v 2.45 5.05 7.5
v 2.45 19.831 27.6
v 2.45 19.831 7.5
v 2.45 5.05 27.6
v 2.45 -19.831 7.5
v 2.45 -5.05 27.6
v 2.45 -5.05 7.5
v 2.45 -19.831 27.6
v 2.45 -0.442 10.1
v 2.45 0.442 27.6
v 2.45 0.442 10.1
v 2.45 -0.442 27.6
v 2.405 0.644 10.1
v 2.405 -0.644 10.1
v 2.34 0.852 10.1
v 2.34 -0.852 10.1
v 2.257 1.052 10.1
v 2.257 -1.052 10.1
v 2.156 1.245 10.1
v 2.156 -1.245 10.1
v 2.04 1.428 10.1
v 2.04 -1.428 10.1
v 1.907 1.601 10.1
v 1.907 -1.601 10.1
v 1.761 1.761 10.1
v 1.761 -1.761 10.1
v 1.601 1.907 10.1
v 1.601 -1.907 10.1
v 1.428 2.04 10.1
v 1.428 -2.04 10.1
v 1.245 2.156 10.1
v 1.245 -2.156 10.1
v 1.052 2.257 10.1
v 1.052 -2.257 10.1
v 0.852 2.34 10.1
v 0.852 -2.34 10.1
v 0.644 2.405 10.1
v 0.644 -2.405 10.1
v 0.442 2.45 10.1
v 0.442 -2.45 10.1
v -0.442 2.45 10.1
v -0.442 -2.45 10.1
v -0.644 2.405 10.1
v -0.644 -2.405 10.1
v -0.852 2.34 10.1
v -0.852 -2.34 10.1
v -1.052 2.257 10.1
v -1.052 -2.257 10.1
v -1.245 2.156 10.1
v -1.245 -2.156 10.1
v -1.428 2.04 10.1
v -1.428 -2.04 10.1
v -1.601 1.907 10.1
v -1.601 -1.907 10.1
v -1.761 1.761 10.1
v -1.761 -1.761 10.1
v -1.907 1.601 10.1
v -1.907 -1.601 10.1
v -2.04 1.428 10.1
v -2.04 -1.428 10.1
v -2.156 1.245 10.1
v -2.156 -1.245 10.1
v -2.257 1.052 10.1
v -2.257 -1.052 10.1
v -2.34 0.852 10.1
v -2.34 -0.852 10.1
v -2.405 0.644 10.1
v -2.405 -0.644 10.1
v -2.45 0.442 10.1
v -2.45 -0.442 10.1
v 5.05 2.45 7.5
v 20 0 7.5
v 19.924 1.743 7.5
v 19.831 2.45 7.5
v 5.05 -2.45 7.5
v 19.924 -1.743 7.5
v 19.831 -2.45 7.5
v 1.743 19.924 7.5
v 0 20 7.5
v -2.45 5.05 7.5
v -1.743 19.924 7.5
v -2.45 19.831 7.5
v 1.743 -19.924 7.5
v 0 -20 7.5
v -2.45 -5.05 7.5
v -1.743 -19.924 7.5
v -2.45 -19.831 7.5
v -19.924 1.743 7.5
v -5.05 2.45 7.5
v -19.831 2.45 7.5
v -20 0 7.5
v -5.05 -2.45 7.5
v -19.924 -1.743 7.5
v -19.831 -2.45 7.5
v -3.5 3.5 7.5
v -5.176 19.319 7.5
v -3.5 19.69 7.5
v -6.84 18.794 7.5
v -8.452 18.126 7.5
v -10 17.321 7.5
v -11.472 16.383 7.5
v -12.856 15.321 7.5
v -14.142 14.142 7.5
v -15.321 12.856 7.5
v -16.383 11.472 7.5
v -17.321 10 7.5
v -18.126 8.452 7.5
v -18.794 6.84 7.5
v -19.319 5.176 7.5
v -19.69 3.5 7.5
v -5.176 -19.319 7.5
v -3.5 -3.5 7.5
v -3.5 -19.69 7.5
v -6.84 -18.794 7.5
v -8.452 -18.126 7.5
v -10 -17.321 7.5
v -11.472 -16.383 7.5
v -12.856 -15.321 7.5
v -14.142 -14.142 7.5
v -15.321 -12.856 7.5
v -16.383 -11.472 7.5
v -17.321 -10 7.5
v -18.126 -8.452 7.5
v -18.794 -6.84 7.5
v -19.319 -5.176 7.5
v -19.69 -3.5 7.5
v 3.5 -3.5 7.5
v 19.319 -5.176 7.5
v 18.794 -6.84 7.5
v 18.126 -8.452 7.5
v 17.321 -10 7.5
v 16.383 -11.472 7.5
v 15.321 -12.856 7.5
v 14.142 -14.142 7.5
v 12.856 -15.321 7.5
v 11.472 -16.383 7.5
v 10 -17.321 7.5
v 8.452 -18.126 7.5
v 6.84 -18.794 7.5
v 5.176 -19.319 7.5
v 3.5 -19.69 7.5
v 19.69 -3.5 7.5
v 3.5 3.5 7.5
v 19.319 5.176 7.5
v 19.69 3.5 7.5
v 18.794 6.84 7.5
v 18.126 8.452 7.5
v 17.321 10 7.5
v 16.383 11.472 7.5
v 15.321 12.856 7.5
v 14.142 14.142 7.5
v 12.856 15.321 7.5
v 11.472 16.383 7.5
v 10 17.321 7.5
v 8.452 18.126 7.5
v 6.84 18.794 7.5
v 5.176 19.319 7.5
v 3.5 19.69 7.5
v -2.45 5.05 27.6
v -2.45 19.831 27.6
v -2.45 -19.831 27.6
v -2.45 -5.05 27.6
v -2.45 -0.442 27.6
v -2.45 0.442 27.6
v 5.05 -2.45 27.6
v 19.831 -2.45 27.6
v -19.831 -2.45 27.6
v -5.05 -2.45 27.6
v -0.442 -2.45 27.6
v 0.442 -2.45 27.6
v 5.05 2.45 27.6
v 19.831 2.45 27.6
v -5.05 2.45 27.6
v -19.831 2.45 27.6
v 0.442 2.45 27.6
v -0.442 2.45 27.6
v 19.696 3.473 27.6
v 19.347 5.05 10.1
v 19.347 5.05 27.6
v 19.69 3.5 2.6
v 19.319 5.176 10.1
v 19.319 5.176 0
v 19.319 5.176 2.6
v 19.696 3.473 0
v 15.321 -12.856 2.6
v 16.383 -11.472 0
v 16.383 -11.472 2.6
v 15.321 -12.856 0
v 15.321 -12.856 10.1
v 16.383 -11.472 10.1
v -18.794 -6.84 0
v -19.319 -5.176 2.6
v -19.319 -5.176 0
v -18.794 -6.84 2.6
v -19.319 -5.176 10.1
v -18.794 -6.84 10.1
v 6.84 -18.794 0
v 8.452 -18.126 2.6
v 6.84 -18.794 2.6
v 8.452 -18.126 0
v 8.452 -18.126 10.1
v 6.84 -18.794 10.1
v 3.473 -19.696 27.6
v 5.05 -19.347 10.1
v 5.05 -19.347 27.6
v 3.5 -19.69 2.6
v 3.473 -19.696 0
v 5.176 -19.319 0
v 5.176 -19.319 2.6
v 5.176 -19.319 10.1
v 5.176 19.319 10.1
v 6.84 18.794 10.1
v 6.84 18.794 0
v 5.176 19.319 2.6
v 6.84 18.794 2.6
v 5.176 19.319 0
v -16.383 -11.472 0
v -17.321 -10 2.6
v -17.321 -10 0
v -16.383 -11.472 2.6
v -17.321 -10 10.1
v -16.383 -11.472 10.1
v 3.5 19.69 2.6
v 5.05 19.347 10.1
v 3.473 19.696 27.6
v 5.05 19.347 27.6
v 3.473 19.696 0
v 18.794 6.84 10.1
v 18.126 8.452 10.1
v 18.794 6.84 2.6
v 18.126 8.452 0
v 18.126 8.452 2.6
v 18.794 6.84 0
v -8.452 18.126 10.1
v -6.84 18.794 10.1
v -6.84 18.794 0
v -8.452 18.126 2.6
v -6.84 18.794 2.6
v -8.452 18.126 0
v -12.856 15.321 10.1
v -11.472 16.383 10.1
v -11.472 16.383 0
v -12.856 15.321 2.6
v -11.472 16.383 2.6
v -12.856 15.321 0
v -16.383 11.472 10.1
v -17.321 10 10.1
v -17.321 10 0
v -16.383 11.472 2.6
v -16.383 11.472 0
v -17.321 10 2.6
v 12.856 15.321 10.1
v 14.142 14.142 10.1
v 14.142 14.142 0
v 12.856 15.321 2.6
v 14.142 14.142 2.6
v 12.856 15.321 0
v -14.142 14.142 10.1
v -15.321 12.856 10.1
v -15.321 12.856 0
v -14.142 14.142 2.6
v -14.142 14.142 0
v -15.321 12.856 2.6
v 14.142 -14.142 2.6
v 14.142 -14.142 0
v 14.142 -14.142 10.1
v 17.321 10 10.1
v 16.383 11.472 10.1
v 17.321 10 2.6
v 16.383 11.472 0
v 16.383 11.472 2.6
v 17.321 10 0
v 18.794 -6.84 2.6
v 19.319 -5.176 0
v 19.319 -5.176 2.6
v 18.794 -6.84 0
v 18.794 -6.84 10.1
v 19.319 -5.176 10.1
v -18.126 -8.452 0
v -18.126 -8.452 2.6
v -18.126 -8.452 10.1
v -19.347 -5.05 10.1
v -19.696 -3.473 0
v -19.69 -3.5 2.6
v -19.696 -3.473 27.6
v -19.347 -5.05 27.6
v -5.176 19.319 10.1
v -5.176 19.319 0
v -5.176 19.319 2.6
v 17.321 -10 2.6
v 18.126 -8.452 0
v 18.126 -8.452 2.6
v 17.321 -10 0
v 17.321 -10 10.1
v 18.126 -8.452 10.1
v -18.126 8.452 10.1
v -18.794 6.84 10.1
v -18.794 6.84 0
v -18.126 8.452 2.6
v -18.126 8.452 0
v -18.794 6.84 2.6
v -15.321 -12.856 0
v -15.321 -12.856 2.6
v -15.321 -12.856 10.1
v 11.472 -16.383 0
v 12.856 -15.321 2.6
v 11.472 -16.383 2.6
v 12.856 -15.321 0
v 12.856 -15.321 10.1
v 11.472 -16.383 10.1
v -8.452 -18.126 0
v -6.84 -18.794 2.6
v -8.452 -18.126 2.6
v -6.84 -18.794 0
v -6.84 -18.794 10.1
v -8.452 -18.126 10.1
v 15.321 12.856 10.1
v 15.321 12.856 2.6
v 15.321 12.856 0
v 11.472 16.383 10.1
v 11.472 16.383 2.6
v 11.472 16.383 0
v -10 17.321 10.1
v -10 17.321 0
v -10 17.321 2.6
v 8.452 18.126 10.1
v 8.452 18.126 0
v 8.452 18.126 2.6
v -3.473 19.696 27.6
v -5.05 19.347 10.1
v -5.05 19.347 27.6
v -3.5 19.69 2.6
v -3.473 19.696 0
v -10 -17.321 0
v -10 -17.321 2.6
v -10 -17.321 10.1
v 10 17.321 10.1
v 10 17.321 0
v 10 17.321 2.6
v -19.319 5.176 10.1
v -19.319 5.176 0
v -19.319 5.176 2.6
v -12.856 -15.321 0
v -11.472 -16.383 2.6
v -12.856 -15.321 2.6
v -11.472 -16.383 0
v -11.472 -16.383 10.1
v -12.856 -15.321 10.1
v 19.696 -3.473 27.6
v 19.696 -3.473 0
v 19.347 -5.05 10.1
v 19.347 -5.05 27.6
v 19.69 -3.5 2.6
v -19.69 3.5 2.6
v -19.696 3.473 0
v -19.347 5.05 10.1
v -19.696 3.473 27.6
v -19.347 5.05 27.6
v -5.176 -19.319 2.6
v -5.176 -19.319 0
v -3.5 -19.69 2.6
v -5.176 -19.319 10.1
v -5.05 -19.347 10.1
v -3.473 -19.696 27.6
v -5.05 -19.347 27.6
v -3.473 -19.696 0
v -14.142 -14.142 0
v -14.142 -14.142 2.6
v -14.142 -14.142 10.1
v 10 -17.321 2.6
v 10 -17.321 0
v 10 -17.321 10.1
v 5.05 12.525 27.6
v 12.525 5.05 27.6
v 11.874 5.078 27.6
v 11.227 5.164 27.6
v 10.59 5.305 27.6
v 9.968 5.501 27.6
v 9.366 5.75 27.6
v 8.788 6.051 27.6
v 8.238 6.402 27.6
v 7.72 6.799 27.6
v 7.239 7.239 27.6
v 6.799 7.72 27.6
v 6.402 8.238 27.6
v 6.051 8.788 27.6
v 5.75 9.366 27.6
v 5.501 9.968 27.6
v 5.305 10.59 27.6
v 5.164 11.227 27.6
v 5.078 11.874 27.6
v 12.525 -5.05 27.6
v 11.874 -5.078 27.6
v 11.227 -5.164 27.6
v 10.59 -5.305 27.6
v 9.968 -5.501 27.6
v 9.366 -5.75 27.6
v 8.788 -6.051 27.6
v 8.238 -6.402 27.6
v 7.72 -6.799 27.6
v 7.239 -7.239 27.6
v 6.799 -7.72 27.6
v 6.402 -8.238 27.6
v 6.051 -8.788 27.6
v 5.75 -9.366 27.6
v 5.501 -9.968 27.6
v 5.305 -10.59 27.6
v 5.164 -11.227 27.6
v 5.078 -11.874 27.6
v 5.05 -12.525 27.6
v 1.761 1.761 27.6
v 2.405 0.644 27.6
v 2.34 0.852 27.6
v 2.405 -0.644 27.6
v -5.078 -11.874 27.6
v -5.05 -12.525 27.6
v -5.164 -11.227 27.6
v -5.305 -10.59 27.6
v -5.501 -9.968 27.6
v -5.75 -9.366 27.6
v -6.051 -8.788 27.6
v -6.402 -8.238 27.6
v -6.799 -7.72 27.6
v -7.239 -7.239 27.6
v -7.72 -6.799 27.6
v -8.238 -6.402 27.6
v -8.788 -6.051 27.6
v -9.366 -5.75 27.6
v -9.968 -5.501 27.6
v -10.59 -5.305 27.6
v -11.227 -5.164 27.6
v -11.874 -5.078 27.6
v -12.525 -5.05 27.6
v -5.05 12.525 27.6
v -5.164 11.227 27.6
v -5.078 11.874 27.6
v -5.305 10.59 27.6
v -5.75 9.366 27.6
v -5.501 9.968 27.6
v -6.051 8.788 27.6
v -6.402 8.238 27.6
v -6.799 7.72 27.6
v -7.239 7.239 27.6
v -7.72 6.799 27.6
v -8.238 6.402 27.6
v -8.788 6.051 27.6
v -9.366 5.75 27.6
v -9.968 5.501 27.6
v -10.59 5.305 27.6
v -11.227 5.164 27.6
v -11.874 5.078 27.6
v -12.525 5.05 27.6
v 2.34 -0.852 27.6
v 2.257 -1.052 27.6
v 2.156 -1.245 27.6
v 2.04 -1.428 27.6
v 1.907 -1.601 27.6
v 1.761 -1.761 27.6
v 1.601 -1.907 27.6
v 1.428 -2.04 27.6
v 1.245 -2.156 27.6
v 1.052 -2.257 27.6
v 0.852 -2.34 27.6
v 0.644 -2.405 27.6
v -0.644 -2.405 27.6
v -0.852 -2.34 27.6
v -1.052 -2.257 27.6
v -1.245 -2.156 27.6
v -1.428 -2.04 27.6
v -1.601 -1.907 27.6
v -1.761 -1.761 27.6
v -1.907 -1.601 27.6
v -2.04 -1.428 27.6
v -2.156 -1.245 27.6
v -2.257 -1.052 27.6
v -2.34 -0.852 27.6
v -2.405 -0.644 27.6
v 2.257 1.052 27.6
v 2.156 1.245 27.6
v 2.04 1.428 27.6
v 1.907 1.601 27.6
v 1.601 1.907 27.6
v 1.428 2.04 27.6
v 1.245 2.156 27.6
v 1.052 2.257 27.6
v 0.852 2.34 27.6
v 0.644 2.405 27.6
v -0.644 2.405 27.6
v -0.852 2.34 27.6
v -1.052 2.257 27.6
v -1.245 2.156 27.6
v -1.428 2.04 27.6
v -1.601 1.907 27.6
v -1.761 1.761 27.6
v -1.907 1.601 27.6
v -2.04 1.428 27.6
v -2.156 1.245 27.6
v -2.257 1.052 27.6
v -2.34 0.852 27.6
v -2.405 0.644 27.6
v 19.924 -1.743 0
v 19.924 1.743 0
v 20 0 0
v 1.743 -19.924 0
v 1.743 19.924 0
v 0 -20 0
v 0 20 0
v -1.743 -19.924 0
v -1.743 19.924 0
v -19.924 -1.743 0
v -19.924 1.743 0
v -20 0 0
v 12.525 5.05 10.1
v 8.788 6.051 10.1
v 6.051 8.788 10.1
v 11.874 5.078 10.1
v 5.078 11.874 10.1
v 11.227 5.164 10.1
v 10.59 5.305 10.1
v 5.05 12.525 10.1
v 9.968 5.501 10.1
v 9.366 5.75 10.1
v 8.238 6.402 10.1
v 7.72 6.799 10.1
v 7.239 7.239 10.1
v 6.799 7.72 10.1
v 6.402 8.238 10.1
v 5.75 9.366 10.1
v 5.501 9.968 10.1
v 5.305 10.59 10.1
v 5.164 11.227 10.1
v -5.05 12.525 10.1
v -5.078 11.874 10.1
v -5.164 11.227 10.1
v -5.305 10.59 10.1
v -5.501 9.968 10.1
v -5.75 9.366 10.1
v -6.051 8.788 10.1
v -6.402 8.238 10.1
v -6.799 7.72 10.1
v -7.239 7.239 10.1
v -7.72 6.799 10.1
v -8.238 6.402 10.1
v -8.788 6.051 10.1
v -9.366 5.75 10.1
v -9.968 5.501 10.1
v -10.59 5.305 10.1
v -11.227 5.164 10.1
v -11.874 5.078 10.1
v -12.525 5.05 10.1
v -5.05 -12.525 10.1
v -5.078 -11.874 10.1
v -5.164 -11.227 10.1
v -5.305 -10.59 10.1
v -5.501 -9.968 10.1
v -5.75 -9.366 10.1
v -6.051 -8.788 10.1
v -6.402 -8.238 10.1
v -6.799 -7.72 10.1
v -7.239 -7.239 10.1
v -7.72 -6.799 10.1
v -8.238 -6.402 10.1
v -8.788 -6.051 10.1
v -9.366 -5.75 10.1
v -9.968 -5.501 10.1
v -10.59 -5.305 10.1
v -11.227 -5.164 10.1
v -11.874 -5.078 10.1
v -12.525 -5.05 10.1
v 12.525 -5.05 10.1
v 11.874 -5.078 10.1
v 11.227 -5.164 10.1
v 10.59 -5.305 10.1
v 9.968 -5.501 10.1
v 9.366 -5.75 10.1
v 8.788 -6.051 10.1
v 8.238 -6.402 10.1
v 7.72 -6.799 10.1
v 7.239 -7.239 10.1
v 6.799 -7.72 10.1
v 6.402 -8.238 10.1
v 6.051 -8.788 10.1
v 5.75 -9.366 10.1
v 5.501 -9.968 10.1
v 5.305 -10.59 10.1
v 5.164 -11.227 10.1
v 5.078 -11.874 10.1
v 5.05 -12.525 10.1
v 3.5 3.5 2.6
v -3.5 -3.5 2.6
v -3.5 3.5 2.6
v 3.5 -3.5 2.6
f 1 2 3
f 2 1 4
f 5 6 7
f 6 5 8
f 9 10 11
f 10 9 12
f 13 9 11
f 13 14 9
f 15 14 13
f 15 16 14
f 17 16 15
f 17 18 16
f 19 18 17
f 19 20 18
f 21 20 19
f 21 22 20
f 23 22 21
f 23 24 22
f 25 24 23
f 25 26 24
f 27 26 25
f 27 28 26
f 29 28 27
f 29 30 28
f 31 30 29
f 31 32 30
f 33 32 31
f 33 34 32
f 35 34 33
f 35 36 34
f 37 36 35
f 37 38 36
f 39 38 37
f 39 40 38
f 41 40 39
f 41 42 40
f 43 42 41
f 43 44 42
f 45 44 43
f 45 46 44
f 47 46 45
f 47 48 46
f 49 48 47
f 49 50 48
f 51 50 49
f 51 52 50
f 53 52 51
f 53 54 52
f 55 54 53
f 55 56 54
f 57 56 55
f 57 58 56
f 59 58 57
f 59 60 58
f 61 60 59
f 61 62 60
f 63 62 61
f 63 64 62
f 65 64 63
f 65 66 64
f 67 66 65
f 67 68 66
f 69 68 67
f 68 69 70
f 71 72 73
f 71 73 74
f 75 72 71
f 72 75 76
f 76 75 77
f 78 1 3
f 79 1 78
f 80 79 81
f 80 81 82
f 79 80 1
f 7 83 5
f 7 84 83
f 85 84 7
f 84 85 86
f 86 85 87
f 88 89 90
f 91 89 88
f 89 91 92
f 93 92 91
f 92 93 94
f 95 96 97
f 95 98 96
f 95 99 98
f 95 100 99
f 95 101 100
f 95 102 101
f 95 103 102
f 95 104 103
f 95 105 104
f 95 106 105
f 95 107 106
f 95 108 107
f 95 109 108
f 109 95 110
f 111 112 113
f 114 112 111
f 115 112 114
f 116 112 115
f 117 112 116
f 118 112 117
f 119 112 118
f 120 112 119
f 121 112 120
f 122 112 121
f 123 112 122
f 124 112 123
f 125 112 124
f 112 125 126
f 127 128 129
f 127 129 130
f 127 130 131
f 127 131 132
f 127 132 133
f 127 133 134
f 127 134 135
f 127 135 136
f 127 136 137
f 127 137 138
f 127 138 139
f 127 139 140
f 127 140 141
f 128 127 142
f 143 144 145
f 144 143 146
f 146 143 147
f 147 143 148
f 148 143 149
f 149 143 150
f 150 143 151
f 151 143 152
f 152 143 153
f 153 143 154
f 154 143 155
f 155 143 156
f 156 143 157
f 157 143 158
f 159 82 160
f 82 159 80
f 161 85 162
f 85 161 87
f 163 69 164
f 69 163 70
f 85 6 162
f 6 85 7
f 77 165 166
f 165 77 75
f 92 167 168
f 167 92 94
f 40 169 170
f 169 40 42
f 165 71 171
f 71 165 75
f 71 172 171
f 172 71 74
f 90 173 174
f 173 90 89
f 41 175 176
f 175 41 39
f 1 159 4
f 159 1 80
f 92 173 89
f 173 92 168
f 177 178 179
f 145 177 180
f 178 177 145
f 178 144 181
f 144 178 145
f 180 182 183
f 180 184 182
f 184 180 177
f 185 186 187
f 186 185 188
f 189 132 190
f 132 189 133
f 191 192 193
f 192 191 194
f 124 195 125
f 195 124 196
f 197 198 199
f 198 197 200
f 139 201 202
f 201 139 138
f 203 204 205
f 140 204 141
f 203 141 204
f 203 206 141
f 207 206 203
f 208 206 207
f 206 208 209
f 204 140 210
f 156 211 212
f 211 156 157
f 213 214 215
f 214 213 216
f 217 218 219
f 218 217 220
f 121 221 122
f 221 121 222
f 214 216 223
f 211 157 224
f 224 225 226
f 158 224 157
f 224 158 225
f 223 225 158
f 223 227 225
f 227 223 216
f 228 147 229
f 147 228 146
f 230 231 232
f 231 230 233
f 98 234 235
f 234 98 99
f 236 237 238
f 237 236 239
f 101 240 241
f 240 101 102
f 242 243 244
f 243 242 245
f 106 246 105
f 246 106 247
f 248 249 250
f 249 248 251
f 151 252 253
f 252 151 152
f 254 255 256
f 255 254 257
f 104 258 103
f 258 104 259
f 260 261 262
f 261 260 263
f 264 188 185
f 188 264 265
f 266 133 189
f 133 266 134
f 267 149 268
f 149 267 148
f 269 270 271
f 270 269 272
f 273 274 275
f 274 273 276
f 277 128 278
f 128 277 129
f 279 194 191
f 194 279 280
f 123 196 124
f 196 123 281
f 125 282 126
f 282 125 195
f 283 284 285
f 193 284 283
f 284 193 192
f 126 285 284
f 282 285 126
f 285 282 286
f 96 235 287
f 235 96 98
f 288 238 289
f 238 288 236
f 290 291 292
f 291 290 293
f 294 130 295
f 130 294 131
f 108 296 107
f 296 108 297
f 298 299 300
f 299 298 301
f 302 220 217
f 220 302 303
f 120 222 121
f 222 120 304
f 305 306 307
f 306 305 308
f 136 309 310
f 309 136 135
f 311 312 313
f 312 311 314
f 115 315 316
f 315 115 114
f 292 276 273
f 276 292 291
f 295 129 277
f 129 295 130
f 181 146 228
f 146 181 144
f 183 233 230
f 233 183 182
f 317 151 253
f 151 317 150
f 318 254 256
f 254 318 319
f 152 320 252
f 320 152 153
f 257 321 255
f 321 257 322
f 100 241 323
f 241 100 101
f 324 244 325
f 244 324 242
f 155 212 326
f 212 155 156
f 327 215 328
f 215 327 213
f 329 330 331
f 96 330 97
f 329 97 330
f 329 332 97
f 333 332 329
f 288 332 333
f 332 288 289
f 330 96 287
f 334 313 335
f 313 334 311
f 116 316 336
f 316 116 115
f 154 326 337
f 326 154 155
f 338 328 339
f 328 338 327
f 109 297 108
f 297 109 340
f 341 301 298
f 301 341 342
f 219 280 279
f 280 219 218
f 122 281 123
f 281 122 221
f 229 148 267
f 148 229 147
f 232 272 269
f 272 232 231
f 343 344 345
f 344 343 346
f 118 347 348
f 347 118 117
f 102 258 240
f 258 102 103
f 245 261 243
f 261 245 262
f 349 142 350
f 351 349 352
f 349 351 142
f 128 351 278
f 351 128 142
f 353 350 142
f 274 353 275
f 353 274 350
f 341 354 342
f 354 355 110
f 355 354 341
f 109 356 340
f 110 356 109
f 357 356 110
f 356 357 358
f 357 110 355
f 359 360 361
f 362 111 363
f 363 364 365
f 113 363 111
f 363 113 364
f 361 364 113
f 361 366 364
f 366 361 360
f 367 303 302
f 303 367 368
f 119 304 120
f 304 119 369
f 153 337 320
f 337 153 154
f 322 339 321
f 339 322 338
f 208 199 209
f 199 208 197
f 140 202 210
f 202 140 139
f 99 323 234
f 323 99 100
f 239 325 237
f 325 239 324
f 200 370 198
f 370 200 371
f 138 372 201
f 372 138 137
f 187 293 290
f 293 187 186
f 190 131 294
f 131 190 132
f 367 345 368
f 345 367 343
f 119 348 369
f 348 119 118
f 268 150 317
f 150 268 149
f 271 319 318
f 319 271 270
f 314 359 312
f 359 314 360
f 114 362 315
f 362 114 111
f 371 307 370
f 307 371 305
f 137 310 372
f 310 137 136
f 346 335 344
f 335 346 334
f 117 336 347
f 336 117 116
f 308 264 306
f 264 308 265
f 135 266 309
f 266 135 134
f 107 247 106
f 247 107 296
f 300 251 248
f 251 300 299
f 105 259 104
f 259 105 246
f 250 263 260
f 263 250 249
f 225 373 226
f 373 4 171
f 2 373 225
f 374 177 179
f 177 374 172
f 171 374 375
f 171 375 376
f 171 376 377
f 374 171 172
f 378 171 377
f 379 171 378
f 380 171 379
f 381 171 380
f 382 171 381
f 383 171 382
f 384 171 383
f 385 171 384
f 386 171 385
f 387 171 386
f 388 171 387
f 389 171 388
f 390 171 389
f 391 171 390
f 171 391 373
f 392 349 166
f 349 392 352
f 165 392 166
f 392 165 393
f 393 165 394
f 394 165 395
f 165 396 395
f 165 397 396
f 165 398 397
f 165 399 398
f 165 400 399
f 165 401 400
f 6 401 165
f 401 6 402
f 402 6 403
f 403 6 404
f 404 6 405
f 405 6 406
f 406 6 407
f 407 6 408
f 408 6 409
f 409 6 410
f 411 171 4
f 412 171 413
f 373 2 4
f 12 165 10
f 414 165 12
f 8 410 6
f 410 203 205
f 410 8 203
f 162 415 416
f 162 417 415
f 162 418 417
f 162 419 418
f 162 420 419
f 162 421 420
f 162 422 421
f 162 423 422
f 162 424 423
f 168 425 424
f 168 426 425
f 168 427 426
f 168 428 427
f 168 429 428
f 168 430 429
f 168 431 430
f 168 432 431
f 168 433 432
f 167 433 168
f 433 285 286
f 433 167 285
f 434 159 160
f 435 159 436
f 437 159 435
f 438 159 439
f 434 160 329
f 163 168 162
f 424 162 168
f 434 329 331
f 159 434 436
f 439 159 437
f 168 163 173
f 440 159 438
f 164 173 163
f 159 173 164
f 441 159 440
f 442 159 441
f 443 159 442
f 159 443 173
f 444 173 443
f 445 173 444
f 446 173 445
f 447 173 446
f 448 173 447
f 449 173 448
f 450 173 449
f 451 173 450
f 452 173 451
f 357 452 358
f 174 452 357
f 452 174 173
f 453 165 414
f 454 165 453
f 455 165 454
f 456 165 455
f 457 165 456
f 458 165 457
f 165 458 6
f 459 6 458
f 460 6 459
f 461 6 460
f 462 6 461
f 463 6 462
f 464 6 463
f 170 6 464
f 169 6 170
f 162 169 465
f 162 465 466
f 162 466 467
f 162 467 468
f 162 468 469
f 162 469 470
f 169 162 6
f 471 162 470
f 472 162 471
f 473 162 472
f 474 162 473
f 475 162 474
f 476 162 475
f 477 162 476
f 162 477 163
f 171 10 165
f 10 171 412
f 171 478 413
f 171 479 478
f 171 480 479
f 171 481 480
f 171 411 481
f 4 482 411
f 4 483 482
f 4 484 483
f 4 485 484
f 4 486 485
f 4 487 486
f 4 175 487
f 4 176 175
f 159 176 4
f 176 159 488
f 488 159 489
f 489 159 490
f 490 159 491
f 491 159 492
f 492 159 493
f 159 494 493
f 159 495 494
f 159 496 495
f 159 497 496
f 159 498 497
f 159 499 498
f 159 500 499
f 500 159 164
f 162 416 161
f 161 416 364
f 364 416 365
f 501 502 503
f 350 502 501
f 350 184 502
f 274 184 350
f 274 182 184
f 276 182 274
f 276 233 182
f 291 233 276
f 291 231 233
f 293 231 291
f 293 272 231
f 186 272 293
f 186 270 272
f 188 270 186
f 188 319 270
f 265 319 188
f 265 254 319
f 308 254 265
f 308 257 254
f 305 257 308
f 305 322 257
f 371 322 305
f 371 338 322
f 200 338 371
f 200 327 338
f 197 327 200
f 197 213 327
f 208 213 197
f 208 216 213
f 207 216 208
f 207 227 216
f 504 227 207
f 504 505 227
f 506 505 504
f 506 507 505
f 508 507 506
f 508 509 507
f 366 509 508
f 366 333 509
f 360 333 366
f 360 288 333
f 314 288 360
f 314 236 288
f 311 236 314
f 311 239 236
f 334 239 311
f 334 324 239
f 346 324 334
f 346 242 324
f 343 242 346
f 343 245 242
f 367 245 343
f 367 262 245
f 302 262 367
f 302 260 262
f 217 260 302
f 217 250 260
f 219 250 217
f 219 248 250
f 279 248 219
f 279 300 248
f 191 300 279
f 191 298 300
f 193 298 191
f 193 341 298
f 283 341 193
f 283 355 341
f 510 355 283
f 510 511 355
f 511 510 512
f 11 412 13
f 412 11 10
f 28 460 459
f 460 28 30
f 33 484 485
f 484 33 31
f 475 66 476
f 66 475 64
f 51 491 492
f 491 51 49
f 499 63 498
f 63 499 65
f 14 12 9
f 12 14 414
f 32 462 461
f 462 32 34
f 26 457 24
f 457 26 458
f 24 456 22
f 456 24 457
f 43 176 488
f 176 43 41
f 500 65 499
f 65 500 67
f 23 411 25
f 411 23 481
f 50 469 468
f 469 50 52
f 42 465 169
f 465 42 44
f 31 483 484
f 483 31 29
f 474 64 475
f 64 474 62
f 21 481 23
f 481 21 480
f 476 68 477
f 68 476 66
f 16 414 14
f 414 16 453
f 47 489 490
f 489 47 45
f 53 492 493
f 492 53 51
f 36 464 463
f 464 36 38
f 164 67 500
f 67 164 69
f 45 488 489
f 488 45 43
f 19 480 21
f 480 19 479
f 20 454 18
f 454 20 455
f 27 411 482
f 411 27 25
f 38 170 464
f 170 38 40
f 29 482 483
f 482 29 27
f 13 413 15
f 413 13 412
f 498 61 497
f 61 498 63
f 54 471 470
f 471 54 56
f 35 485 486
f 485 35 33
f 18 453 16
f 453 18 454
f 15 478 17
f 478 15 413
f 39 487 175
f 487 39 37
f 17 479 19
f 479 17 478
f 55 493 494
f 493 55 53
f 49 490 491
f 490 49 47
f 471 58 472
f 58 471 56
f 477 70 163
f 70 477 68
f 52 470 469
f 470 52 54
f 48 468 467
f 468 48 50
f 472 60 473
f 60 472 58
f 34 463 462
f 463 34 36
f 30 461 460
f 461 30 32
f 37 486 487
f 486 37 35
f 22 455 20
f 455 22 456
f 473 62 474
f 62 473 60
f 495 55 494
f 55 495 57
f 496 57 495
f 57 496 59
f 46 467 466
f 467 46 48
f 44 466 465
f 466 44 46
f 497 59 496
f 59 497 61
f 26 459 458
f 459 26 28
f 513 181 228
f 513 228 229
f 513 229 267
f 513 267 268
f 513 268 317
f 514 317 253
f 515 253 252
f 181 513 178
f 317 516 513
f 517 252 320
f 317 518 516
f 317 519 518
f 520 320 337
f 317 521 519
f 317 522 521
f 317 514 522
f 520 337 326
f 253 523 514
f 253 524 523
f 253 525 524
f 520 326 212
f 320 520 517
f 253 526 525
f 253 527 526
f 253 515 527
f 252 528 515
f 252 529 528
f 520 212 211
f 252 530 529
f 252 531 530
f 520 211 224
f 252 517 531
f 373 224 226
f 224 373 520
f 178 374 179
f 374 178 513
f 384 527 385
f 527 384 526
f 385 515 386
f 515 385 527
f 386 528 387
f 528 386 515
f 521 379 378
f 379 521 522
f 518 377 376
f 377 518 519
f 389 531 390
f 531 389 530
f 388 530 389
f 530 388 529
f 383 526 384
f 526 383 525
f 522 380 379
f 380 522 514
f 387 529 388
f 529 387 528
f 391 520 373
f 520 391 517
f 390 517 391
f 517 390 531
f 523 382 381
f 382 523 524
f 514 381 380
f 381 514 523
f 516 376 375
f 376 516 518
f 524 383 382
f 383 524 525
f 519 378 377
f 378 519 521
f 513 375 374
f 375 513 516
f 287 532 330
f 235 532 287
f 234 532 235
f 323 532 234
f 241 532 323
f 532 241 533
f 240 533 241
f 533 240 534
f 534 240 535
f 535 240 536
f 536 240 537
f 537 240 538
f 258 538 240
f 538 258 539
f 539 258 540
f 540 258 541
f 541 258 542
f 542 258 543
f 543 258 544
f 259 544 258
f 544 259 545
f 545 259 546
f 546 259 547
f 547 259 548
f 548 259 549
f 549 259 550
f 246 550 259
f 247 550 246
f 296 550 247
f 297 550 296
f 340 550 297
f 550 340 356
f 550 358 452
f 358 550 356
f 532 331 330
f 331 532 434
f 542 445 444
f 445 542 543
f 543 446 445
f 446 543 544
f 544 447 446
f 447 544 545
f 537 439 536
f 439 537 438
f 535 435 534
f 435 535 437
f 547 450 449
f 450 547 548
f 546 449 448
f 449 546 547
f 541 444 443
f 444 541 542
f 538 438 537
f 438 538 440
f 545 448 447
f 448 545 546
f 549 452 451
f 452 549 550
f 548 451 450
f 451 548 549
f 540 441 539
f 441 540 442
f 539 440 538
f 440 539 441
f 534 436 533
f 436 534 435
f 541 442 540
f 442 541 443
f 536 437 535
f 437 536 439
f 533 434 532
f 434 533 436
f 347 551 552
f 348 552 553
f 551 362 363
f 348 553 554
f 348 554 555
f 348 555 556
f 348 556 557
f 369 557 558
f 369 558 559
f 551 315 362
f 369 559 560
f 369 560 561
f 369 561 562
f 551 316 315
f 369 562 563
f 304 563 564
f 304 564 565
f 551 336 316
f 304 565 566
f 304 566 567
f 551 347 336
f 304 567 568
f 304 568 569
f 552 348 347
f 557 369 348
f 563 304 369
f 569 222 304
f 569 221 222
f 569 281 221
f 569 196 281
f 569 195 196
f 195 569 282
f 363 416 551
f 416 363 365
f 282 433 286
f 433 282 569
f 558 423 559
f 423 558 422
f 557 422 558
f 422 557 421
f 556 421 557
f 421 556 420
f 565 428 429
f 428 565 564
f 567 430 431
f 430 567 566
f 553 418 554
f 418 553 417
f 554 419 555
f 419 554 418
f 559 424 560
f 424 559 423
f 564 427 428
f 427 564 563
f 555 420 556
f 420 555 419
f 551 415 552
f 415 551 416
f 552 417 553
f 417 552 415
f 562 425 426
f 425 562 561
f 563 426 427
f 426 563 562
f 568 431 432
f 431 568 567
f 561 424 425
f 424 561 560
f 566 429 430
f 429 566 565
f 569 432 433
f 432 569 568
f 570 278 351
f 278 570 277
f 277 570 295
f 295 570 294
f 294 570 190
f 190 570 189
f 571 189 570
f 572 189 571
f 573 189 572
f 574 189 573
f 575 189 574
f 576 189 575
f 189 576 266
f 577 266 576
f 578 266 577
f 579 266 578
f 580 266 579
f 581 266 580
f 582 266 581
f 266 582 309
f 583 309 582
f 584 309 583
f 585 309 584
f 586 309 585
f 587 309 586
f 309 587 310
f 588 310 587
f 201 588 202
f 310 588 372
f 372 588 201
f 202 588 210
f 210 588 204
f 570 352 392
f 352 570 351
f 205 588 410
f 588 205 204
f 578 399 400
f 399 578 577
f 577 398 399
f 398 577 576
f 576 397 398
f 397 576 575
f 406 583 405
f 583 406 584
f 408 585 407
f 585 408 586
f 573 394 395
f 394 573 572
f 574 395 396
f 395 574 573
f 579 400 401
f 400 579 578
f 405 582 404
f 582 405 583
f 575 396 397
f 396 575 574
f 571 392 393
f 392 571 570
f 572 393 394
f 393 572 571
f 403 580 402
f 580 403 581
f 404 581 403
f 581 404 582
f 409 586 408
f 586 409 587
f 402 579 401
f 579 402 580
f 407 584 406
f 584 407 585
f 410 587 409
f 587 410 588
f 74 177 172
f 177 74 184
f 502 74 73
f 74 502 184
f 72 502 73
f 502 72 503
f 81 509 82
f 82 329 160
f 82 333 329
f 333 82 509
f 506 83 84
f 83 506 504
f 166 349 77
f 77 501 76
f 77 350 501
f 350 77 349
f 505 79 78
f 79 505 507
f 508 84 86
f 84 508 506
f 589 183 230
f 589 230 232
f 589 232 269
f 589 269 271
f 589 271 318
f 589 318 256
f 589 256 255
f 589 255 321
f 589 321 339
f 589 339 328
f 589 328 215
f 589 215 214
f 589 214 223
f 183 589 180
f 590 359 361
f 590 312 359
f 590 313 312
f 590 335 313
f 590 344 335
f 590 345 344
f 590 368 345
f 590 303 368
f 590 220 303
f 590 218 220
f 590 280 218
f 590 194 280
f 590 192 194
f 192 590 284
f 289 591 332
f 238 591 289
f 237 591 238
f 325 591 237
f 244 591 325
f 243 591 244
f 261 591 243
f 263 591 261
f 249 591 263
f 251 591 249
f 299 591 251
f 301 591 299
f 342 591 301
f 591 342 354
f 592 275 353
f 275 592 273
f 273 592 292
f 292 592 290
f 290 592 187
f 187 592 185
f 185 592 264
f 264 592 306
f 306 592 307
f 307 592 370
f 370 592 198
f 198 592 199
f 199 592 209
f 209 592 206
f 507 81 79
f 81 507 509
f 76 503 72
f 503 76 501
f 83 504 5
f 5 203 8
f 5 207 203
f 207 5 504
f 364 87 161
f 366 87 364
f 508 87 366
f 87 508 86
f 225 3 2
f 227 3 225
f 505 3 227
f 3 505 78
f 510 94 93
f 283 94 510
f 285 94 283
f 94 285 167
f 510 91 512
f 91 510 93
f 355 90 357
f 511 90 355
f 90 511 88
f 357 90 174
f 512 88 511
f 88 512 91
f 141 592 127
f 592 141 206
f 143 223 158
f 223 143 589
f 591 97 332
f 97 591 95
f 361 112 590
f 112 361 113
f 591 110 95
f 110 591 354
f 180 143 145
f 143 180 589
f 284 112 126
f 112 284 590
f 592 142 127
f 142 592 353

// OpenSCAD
//  Feb 2011, by ftoad  cc-na
// build up module for bracket..

// SOME VARS

radius = 20;                     // was 22
height = 25;                    //  height of the cube, was 28
diameter = radius*2;
wall = 2.6;                          // was 4
filler_rod = 7;  
spacing = 4.9;  
pad = 0.1;
support =  radius - wall -spacing/2; // a portion of the X or Y exposed length along the parallel cubes 

// OB'ECT D'ART


wireshelf_bracket();


//**********************************
// MODULES
//***********************************


// todo: this module must be modified with better translate() and correct amount of $pad to eliminate the upper level folding error in Z layers.. this is hard to describe -- the z layer folds inwards a bit where it should be making smooth curves from wall to wall..
module interiorcorner_fillet(){
translate([-support/2,0,0]) cube([1.5*support,1.5*support,height-wall-spacing]); 
translate([0,-support/2,0]) cube([1.5*support,1.5*support,height-wall-spacing]); 
translate([0,0,0]) cylinder(r1=support/2,r2=support/2, h=height-wall-spacing, $fa=5, $fs=0.1);   // no center on this cylinder so the spacing will work
}


module cylinder_fillet(){
difference(){
cylinder(h=height+wall*2+spacing,r=2*radius,$fa=5, $fs=0.1);
cylinder(h=height+wall*2+spacing, r=radius,$fa=5, $fs=0.1);
}
}


module top_cylinder_pruning(){
rotate([0,0,0]) translate([-spacing/2,-radius,spacing+wall]) cube([spacing,support,wall]);          // Y axis cylinder removal rod
rotate([0,0,90]) translate([-spacing/2,-radius,spacing+wall]) cube([spacing,support,wall]);          // x axis cylinder removal rod
rotate([0,0,180]) translate([-spacing/2,-radius,spacing+wall]) cube([spacing,support,wall]);          // y axis cylinder removal rod
rotate([0,0,270]) translate([-spacing/2,-radius,spacing+wall]) cube([spacing,support,wall]);          // x axis cylinder removal rod
}


module partial_bracket()
{

translate([0,0,0]) cylinder(h=wall,r=radius, $fa=5, $fs=0.1);  // bottom cylinder

//cutting down the upper cylinder thickness at crucial points
difference(){
translate([0,0,wall+spacing]) cylinder(h=wall,r=radius, $fa=5, $fs=0.1);  // top cylinder
top_cylinder_pruning();
}

translate([-radius,(spacing/2),wall+spacing]) cube([diameter,wall,height-spacing]); 		// X axis rect wall
translate([-radius,-wall-spacing/2,wall+spacing]) cube([diameter,wall,height-spacing]);	// X axis rect wall


rotate([0,0,90]) translate([-radius,(spacing/2),wall+spacing]) cube([diameter,wall,height-spacing]);  		// Y axis rect wall
rotate([0,0,90]) translate([-radius,-wall-spacing/2,wall+spacing]) cube([diameter,wall,height-spacing]);	// Y axis rect wall


translate([-filler_rod/2,-radius,wall]) cube([filler_rod,diameter,spacing]);          // Y axis filler rod
translate([-radius,-filler_rod/2,wall])  cube([diameter,filler_rod,spacing]);       // X axis filler rod  (shift up by height of Cylinder)

// translate([-2.5,-2.5,-33])  cube([5,5,84]);  // Z axis filler rod

//center support 
difference(){
	translate ([-2.5,-2.5,0]) cube([5+pad,5+pad,height+wall]);
	translate([0,0,4]) cylinder(r=2.49, h=height+wall ,$fa=5,$fs=0.2);
}



// fillet the  4wall sides for support wall1
difference(){
	translate([wall+spacing/2,wall+spacing/2,wall*2+spacing]) cube([ support+pad,support+pad,height-wall-spacing]);  // strengthen the upper walls
	rotate([0,0,0]) translate([support/2+wall+spacing/2,support/2+wall+spacing/2,2*wall+spacing]) interiorcorner_fillet();

}

// fillet the  4wall sides for support wall2
difference(){
	translate([-radius,wall+spacing/2,wall*2+spacing]) cube([ support+pad,support+pad,height-wall-spacing]);  // strengthen the upper walls
	rotate([0,0,90]) translate([support/2+wall+spacing/2,support/2+wall+spacing/2,2*wall+spacing]) interiorcorner_fillet();
}

// fillet the  4wall sides for support wall3
difference(){
	translate([-radius,-radius,wall*2+spacing]) cube([ support+pad,support+pad,height-wall-spacing]);  // strengthen the upper walls
	rotate([0,0,180]) translate([support/2+wall+spacing/2,support/2+wall+spacing/2,2*wall+spacing]) interiorcorner_fillet();
}

// fillet the  4wall sides for support wall4
difference(){
	translate([wall+spacing/2,-radius,wall*2+spacing]) cube([ support+pad,support+pad ,height-wall-spacing]); //strengthen the upper walls
	rotate([0,0,270]) translate([support/2+wall+spacing/2,support/2+wall+spacing/2,2*wall+spacing]) interiorcorner_fillet();
}

}

module wireshelf_bracket(){
	difference(){
		partial_bracket();
		cylinder_fillet([0,0,40]);
	}
}
